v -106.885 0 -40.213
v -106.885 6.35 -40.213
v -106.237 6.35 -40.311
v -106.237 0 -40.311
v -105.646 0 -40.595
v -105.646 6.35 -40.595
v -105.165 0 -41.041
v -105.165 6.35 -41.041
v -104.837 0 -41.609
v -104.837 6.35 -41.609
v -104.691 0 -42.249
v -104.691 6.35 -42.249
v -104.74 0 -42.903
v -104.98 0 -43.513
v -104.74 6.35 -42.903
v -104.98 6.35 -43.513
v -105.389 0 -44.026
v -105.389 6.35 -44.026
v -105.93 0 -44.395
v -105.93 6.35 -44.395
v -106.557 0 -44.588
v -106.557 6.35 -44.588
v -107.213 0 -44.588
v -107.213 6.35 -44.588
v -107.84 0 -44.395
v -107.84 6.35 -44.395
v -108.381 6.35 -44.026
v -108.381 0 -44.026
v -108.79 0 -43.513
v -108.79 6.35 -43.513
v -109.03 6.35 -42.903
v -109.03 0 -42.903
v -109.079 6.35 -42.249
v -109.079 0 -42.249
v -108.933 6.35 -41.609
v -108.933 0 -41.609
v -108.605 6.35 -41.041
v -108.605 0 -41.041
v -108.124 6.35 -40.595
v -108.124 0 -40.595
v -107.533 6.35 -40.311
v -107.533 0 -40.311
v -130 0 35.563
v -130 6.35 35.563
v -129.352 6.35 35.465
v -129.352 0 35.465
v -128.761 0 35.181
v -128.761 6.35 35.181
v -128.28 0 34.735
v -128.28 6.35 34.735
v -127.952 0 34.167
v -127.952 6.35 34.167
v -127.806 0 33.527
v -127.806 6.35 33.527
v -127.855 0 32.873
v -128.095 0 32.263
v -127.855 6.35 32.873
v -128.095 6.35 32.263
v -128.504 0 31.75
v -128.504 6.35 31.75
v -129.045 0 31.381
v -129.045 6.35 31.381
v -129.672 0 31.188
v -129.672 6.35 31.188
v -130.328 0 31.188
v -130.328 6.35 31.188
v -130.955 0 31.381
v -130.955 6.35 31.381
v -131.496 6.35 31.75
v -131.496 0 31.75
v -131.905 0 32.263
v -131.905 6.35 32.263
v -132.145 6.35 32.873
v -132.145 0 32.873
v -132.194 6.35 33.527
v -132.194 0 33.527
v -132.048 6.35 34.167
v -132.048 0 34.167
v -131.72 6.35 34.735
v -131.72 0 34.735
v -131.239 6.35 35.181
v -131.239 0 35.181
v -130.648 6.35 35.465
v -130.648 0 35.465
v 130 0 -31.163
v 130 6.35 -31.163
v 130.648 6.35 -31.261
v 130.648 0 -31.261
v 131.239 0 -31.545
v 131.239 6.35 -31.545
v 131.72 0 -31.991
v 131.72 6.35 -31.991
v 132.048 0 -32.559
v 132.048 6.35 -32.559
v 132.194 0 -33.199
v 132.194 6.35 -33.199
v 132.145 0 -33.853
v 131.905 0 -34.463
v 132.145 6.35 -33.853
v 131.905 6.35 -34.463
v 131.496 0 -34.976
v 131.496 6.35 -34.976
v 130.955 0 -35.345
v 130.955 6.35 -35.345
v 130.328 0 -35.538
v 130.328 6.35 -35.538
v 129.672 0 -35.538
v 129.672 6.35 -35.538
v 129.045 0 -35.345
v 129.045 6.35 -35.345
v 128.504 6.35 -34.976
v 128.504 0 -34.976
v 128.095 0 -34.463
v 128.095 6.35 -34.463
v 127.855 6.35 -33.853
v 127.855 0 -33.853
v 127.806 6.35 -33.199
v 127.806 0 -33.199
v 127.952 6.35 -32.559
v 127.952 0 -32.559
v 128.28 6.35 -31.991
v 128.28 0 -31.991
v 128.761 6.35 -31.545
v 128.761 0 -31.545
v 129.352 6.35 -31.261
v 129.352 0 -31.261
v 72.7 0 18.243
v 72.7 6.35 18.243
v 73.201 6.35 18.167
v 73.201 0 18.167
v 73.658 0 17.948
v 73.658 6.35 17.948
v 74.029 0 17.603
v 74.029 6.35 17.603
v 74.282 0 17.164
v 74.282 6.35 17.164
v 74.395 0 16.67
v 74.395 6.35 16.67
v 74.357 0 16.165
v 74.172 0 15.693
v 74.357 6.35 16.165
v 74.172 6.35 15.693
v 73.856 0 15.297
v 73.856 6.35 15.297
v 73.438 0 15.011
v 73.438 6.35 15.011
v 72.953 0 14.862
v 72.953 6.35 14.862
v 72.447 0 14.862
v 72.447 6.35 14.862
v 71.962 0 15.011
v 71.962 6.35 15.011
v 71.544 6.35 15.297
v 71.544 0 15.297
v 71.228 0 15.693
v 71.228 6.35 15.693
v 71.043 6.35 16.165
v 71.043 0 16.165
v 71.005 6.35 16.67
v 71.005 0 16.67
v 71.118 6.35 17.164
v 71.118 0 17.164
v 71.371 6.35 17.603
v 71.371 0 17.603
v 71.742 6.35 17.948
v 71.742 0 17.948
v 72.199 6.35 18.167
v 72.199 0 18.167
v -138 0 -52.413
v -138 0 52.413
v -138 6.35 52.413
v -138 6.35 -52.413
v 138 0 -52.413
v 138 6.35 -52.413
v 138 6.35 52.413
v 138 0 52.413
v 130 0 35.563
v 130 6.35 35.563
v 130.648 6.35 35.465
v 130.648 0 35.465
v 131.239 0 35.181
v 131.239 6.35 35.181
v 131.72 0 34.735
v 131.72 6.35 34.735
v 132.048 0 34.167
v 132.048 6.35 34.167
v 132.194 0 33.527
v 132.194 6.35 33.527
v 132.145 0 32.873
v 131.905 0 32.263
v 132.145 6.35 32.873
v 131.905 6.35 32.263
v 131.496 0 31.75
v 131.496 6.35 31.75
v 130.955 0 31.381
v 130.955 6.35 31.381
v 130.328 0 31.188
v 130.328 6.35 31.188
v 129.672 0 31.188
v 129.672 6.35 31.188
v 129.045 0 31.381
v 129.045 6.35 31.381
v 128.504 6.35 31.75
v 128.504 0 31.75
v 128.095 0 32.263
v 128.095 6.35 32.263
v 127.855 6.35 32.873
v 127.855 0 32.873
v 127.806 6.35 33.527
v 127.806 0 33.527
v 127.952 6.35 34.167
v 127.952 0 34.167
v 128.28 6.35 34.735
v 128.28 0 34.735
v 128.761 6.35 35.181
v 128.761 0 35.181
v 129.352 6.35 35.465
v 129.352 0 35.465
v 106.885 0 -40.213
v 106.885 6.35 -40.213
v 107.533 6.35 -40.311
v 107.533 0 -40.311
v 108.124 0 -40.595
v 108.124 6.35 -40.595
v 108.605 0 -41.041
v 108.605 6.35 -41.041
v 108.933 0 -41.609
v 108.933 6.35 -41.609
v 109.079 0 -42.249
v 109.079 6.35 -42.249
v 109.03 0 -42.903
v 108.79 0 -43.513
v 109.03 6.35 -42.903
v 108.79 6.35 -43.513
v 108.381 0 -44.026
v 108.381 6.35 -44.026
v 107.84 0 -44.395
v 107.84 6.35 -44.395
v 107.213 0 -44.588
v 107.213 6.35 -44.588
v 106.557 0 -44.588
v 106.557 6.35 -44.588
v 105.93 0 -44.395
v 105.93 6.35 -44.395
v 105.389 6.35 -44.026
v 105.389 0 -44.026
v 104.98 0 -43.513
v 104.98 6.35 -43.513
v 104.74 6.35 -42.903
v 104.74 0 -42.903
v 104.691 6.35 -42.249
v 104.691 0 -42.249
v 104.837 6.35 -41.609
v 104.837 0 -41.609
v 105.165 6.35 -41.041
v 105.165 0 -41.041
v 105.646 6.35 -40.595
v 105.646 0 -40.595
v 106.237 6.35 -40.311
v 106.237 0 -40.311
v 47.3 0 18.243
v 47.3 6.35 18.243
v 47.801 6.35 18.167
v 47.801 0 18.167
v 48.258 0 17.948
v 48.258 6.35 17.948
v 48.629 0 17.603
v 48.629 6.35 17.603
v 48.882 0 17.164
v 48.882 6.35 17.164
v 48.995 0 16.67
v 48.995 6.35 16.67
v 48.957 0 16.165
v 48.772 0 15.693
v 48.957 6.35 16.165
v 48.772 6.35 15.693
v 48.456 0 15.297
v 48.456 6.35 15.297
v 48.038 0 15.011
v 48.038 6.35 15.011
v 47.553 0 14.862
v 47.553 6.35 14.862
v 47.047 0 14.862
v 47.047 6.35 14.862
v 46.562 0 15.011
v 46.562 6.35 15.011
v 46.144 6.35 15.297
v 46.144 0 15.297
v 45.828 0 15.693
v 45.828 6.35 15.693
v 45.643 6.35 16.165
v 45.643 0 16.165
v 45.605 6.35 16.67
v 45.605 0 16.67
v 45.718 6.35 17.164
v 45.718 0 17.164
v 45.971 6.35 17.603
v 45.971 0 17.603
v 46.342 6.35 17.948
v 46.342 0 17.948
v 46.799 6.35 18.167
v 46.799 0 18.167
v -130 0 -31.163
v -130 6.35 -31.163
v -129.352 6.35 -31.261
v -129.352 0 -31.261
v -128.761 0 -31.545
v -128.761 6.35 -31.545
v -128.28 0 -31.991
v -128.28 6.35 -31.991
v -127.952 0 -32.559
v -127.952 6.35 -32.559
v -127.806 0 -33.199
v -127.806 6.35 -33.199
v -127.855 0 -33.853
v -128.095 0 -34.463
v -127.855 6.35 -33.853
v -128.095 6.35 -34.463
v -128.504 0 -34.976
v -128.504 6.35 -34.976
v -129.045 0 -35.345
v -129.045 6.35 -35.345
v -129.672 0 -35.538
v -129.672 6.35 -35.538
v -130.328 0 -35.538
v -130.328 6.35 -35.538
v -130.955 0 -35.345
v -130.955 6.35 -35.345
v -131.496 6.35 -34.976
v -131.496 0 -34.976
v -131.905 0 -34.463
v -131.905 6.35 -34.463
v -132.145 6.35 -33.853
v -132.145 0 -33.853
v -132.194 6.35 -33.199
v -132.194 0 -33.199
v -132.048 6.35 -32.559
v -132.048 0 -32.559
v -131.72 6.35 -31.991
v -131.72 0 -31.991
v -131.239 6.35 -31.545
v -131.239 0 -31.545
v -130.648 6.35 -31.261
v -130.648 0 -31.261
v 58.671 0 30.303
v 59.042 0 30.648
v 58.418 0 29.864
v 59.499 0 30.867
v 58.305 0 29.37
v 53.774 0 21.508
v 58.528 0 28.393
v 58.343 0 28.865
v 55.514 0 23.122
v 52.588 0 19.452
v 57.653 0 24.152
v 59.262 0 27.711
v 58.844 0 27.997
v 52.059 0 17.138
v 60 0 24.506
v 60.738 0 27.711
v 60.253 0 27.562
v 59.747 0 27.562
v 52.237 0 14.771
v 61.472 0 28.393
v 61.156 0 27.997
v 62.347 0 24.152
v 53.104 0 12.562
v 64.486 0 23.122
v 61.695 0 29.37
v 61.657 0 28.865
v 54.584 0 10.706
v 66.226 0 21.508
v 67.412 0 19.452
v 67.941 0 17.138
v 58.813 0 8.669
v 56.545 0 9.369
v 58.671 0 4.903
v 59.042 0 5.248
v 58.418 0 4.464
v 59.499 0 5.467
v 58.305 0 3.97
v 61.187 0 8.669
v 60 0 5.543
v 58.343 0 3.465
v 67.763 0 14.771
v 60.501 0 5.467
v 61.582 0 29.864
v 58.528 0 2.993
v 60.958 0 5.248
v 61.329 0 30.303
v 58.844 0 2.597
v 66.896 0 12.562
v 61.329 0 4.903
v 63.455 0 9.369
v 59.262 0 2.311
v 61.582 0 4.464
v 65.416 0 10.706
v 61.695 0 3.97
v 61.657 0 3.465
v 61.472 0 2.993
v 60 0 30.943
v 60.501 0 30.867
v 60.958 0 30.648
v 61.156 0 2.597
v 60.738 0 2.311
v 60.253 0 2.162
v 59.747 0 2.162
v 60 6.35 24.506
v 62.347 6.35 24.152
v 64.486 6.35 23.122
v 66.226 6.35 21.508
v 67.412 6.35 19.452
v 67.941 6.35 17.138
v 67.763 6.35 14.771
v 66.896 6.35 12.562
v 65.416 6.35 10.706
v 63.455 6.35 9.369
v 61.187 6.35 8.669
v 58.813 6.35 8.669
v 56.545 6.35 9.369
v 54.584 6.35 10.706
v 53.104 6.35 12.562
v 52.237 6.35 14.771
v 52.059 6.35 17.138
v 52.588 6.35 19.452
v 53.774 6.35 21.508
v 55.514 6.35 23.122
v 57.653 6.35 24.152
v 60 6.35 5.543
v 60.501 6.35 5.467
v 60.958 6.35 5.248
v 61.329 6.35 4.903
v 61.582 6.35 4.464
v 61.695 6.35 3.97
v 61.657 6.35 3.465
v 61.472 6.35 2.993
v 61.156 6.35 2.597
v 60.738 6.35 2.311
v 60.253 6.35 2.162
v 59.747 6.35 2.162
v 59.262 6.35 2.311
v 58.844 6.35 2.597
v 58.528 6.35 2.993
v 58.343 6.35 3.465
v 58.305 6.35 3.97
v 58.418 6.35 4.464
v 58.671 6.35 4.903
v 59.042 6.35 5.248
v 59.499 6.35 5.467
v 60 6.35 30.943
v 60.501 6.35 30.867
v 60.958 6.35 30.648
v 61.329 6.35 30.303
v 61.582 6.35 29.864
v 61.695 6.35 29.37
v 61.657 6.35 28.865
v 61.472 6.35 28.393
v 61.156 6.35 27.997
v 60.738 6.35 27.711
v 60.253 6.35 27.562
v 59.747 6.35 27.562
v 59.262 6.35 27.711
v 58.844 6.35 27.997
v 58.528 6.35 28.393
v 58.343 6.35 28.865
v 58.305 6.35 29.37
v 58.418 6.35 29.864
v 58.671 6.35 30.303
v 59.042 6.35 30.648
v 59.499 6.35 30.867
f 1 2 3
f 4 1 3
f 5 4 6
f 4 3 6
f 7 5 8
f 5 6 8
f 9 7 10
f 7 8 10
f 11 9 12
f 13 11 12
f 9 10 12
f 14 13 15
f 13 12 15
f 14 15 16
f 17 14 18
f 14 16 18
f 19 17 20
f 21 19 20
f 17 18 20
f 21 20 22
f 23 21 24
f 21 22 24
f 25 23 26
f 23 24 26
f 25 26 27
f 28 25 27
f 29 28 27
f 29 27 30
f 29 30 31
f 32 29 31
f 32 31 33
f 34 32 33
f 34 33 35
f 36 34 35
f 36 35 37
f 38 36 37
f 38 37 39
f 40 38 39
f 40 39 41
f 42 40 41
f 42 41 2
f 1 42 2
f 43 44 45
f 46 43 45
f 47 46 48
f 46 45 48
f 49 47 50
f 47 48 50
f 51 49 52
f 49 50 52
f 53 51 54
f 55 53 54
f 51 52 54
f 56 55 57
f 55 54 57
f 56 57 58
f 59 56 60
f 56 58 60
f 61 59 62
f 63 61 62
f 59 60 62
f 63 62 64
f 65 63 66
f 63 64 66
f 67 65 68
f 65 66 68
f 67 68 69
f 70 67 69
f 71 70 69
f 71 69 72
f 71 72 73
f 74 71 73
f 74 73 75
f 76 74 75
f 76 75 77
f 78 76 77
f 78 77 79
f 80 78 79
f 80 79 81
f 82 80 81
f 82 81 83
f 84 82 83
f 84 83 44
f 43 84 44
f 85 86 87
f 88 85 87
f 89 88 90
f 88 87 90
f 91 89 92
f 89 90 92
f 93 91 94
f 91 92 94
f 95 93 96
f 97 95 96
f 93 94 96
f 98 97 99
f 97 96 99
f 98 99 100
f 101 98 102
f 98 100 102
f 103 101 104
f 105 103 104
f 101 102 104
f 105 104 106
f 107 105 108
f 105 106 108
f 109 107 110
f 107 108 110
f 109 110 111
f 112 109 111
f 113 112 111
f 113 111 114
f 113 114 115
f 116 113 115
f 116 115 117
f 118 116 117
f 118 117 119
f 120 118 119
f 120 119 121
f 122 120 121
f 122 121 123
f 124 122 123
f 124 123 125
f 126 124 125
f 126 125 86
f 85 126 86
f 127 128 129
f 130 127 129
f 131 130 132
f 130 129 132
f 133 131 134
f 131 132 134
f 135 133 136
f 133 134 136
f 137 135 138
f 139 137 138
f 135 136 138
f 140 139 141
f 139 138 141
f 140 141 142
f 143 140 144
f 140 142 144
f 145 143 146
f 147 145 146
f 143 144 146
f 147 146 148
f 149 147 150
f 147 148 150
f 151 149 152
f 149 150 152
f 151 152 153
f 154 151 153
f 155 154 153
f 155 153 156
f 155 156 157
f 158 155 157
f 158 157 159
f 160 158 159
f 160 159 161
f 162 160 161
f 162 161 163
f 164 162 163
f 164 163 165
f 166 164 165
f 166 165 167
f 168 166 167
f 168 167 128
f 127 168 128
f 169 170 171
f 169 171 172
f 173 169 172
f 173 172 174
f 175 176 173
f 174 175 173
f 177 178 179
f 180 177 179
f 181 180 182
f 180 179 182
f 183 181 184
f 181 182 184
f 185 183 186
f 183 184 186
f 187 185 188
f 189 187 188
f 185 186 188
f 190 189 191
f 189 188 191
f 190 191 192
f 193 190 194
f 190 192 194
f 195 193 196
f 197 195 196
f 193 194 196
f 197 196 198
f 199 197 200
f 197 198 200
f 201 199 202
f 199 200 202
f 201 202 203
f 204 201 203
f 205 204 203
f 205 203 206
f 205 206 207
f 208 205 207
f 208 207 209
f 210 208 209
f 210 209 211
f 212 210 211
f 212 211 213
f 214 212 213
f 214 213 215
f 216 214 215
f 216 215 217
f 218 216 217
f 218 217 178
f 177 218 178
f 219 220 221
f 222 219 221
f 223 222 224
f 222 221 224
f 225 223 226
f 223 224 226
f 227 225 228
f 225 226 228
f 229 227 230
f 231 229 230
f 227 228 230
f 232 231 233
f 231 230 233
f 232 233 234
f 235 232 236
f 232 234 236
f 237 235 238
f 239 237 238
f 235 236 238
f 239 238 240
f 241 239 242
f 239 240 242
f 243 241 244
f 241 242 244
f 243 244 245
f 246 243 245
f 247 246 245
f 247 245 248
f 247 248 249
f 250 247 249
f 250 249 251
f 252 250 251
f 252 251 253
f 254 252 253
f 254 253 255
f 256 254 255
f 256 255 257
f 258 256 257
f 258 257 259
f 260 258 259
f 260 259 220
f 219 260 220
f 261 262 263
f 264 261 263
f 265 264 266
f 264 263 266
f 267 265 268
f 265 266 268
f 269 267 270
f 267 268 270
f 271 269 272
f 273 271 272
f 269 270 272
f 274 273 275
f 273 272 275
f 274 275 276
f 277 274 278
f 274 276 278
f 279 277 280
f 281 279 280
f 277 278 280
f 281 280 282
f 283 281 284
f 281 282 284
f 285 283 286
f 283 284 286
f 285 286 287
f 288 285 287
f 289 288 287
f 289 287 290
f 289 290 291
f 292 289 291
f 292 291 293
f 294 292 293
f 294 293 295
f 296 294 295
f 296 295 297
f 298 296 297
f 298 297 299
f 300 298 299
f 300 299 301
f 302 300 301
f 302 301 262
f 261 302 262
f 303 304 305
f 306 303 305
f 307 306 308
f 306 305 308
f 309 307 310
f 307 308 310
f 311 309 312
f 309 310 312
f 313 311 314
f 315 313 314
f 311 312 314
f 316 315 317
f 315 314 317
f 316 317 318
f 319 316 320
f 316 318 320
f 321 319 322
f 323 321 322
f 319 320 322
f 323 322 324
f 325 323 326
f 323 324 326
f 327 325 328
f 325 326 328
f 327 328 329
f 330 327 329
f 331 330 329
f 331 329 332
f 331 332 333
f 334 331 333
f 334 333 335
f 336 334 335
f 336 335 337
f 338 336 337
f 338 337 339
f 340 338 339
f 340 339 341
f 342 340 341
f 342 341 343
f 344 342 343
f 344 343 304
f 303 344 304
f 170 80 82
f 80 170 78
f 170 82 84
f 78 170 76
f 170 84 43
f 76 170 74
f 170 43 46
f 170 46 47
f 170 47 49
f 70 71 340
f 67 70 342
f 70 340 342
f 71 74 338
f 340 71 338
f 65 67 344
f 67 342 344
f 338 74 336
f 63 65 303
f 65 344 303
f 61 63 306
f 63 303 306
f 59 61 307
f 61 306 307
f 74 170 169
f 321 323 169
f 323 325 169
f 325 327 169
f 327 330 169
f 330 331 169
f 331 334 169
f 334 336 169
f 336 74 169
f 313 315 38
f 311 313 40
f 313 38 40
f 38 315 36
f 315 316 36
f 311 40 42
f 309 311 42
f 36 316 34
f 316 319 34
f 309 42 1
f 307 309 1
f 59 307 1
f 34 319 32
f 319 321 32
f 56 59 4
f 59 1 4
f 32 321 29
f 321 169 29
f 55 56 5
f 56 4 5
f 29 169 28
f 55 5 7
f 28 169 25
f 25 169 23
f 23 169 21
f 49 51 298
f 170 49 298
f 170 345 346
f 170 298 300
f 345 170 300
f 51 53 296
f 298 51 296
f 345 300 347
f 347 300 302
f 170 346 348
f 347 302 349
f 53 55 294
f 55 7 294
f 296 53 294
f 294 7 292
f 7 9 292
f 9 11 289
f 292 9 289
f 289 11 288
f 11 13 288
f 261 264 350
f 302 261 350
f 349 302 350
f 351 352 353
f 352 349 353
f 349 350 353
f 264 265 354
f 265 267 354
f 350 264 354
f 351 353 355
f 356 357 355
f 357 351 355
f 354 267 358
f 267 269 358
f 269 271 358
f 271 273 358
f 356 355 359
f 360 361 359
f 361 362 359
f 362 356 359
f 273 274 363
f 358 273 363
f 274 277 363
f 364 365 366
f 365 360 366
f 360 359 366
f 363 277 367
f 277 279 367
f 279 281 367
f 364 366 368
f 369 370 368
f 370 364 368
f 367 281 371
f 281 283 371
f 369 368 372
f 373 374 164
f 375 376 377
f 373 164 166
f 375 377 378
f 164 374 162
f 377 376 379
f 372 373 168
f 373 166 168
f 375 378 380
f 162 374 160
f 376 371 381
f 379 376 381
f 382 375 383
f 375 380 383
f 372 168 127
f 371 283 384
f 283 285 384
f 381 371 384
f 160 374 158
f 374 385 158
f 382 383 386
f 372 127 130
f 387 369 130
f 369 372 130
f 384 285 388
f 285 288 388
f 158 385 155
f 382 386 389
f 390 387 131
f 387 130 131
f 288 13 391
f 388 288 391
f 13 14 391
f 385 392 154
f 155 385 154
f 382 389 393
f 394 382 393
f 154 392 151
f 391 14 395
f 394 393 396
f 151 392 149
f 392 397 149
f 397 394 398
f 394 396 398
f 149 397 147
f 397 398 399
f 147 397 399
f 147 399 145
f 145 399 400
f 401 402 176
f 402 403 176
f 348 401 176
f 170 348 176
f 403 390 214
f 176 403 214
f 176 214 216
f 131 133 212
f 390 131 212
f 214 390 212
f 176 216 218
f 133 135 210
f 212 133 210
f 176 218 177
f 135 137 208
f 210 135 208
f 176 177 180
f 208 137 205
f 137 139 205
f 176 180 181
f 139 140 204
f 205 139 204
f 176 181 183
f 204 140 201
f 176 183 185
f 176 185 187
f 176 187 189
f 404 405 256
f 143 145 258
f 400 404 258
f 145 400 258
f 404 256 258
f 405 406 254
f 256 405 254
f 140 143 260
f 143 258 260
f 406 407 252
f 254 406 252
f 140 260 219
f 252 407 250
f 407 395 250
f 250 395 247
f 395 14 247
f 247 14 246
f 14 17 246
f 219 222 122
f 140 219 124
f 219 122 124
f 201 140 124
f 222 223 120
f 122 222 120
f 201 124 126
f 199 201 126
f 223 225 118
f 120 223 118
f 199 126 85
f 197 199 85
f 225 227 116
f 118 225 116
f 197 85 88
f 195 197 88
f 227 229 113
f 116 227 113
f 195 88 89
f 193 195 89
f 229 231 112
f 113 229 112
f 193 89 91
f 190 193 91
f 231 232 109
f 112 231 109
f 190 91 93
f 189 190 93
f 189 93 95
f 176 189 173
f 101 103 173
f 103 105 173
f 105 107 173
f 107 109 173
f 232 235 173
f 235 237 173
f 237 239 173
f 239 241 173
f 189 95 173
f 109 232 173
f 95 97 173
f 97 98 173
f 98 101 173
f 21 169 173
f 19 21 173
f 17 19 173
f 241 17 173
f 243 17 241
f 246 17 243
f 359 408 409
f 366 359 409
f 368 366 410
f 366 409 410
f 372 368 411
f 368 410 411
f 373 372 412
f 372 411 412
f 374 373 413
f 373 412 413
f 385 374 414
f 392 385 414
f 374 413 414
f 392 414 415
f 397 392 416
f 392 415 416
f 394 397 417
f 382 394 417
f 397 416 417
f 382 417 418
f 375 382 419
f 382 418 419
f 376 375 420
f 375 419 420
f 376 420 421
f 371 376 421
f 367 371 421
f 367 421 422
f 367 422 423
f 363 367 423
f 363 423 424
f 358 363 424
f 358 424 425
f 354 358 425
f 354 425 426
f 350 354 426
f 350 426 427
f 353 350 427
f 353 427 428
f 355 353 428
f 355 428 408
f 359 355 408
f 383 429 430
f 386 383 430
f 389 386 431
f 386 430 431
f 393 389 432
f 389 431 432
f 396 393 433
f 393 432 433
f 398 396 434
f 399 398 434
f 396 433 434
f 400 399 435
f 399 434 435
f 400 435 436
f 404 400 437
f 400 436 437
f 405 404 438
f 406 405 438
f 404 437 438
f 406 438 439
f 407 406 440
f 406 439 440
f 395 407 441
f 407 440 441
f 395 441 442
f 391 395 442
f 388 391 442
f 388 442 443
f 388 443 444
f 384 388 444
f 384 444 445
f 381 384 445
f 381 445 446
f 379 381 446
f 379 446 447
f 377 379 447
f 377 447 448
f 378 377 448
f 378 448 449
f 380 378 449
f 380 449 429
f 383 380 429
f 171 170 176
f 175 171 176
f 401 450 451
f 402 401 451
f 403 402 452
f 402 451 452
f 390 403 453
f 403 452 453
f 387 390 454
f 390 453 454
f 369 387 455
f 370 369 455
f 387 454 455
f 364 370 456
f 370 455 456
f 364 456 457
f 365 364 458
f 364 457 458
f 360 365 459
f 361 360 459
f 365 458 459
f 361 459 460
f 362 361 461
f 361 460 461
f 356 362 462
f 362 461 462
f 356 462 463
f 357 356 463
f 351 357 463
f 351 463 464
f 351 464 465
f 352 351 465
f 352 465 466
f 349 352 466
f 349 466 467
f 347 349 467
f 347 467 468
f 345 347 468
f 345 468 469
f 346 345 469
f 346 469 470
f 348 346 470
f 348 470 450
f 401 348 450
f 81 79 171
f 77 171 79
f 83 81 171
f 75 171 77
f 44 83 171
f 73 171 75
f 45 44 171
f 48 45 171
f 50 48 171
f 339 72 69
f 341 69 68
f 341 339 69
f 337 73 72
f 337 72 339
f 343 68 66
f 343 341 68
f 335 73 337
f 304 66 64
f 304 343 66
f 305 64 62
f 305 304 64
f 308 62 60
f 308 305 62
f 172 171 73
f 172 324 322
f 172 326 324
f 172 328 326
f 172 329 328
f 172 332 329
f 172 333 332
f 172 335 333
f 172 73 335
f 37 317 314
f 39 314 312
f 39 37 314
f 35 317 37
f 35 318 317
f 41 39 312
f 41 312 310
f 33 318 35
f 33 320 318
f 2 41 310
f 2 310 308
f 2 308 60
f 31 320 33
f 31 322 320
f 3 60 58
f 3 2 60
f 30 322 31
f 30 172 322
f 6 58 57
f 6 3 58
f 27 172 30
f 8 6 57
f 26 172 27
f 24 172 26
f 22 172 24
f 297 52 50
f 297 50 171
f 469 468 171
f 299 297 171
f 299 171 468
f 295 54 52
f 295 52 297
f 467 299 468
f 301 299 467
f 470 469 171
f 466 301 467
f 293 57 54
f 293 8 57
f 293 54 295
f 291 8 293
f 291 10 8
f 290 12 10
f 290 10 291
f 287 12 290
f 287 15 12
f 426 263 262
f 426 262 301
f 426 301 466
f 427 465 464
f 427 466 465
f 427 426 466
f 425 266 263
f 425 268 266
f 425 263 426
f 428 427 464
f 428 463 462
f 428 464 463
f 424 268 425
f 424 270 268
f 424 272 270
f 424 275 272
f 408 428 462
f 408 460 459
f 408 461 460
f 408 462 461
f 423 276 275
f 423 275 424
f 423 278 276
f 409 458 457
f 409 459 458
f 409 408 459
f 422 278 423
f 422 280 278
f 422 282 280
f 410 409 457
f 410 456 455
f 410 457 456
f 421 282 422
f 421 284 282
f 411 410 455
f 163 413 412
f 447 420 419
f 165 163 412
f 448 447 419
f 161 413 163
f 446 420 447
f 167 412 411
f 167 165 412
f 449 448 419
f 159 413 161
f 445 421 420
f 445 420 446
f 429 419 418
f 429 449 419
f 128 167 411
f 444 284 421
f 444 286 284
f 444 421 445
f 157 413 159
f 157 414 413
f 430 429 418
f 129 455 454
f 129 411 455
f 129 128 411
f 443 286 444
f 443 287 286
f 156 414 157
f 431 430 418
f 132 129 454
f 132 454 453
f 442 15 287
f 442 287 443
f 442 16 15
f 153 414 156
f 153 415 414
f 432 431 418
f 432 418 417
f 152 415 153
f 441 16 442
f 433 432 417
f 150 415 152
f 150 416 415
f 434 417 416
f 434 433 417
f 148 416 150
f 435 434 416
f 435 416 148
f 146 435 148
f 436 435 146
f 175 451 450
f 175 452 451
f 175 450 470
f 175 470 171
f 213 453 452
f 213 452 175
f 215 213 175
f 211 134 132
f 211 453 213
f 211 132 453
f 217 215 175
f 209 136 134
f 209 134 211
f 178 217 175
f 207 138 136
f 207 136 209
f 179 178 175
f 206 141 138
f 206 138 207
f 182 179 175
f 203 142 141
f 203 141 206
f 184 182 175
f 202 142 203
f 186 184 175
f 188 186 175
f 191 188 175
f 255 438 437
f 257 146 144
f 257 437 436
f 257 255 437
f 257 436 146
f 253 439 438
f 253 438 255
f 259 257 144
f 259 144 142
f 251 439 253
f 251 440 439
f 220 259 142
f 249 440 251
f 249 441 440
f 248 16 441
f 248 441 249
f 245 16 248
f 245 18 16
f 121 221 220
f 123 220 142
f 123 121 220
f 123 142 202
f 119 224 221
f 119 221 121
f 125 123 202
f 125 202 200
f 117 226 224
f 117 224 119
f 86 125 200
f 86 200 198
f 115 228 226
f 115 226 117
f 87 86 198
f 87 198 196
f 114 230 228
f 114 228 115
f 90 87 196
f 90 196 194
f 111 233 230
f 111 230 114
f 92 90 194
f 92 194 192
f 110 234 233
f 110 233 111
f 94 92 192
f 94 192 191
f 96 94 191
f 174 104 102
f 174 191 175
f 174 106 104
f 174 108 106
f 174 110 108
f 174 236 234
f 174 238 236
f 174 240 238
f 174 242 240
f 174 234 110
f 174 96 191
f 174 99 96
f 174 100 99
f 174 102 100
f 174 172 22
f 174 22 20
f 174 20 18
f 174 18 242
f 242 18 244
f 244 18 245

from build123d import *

# Parameters (mm, degrees)
SKETCH1_W           = 276
SKETCH1_H           = 104.826000086
BOSS_EXTRUDE1_DEPTH = 6.35
CUT_EXTRUDE1_REACH  = 149.755
SKETCH2_R           = 2.2
CUT_EXTRUDE2_REACH  = 149.755
SKETCH3_R           = 2.2
CUT_EXTRUDE3_REACH  = 149.755
SKETCH4_R           = 7.9629
CUT_EXTRUDE4_REACH  = 149.755
SKETCH5_R           = 1.7


with BuildPart() as part:
    # Sketch1 → Boss-Extrude1 (new body)
    with BuildSketch(Plane(origin=(0, 0, 0), x_dir=(1, 0, 0), z_dir=(0, 1, 0))):
        Rectangle(SKETCH1_W, SKETCH1_H)
    extrude(amount=BOSS_EXTRUDE1_DEPTH)

    # Sketch2 → Cut-Extrude1 (cut, up to next)
    with BuildSketch(Plane(origin=(0, 6.35, 0), x_dir=(1, 0, 0), z_dir=(0, 1, 0)), mode=Mode.PRIVATE) as cut_extrude1_sk1:
        with Locations(Location((-130, 33.363000043, 0), (0, 0, 270))):
            Circle(SKETCH2_R)
    cut_extrude1_tool1 = extrude(cut_extrude1_sk1.sketch, amount=-CUT_EXTRUDE1_REACH, mode=Mode.PRIVATE) & part.part
    # Sketch2 → Cut-Extrude1 (cut, up to next)
    with BuildSketch(Plane(origin=(0, 6.35, 0), x_dir=(1, 0, 0), z_dir=(0, 1, 0)), mode=Mode.PRIVATE) as cut_extrude1_sk2:
        with Locations(Location((-130, -33.363000043, 0), (0, 0, 270))):
            Circle(SKETCH2_R)
    cut_extrude1_tool2 = extrude(cut_extrude1_sk2.sketch, amount=-CUT_EXTRUDE1_REACH, mode=Mode.PRIVATE) & part.part
    # Sketch2 → Cut-Extrude1 (cut, up to next)
    with BuildSketch(Plane(origin=(0, 6.35, 0), x_dir=(1, 0, 0), z_dir=(0, 1, 0)), mode=Mode.PRIVATE) as cut_extrude1_sk3:
        with Locations(Location((130, -33.363000043, 0), (0, 0, 270))):
            Circle(SKETCH2_R)
    cut_extrude1_tool3 = extrude(cut_extrude1_sk3.sketch, amount=-CUT_EXTRUDE1_REACH, mode=Mode.PRIVATE) & part.part
    # Sketch2 → Cut-Extrude1 (cut, up to next)
    with BuildSketch(Plane(origin=(0, 6.35, 0), x_dir=(1, 0, 0), z_dir=(0, 1, 0)), mode=Mode.PRIVATE) as cut_extrude1_sk4:
        with Locations(Location((130, 33.363000043, 0), (0, 0, 270))):
            Circle(SKETCH2_R)
    cut_extrude1_tool4 = extrude(cut_extrude1_sk4.sketch, amount=-CUT_EXTRUDE1_REACH, mode=Mode.PRIVATE) & part.part
    add(cut_extrude1_tool1.solids().sort_by_distance((-130, 6.35, -33.363))[0], mode=Mode.SUBTRACT)
    add(cut_extrude1_tool2.solids().sort_by_distance((-130, 6.35, 33.363))[0], mode=Mode.SUBTRACT)
    add(cut_extrude1_tool3.solids().sort_by_distance((130, 6.35, 33.363))[0], mode=Mode.SUBTRACT)
    add(cut_extrude1_tool4.solids().sort_by_distance((130, 6.35, -33.363))[0], mode=Mode.SUBTRACT)

    # Sketch3 → Cut-Extrude2 (cut, up to next)
    with BuildSketch(Plane(origin=(0, 6.35, 0), x_dir=(1, 0, 0), z_dir=(0, 1, 0)), mode=Mode.PRIVATE) as cut_extrude2_sk1:
        with Locations(Location((-106.885, 42.413000043, 0), (0, 0, 270))):
            Circle(SKETCH3_R)
    cut_extrude2_tool1 = extrude(cut_extrude2_sk1.sketch, amount=-CUT_EXTRUDE2_REACH, mode=Mode.PRIVATE) & part.part
    # Sketch3 → Cut-Extrude2 (cut, up to next)
    with BuildSketch(Plane(origin=(0, 6.35, 0), x_dir=(1, 0, 0), z_dir=(0, 1, 0)), mode=Mode.PRIVATE) as cut_extrude2_sk2:
        with Locations(Location((106.885, 42.413000043, 0), (0, 0, 270))):
            Circle(SKETCH3_R)
    cut_extrude2_tool2 = extrude(cut_extrude2_sk2.sketch, amount=-CUT_EXTRUDE2_REACH, mode=Mode.PRIVATE) & part.part
    add(cut_extrude2_tool1.solids().sort_by_distance((-106.885, 6.35, -42.413))[0], mode=Mode.SUBTRACT)
    add(cut_extrude2_tool2.solids().sort_by_distance((106.885, 6.35, -42.413))[0], mode=Mode.SUBTRACT)

    # Sketch4 → Cut-Extrude3 (cut, up to next)
    with BuildSketch(Plane(origin=(0, 6.35, 0), x_dir=(1, 0, 0), z_dir=(0, 1, 0)), mode=Mode.PRIVATE) as cut_extrude3_sk1:
        with Locations(Location((60, -16.543000155, 0), (0, 0, 270))):
            Circle(SKETCH4_R)
    cut_extrude3_tool1 = extrude(cut_extrude3_sk1.sketch, amount=-CUT_EXTRUDE3_REACH, mode=Mode.PRIVATE) & part.part
    add(cut_extrude3_tool1.solids().sort_by_distance((60, 6.35, 16.543))[0], mode=Mode.SUBTRACT)

    # Sketch5 → Cut-Extrude4 (cut, up to next)
    with BuildSketch(Plane(origin=(0, 6.35, 0), x_dir=(1, 0, 0), z_dir=(0, 1, 0)), mode=Mode.PRIVATE) as cut_extrude4_sk1:
        with Locations(Location((60, -3.843000155, 0), (0, 0, 270))):
            Circle(SKETCH5_R)
    cut_extrude4_tool1 = extrude(cut_extrude4_sk1.sketch, amount=-CUT_EXTRUDE4_REACH, mode=Mode.PRIVATE) & part.part
    # Sketch5 → Cut-Extrude4 (cut, up to next)
    with BuildSketch(Plane(origin=(0, 6.35, 0), x_dir=(1, 0, 0), z_dir=(0, 1, 0)), mode=Mode.PRIVATE) as cut_extrude4_sk2:
        with Locations(Location((72.7, -16.543000155, 0), (0, 0, 270))):
            Circle(SKETCH5_R)
    cut_extrude4_tool2 = extrude(cut_extrude4_sk2.sketch, amount=-CUT_EXTRUDE4_REACH, mode=Mode.PRIVATE) & part.part
    # Sketch5 → Cut-Extrude4 (cut, up to next)
    with BuildSketch(Plane(origin=(0, 6.35, 0), x_dir=(1, 0, 0), z_dir=(0, 1, 0)), mode=Mode.PRIVATE) as cut_extrude4_sk3:
        with Locations(Location((60, -29.243000155, 0), (0, 0, 270))):
            Circle(SKETCH5_R)
    cut_extrude4_tool3 = extrude(cut_extrude4_sk3.sketch, amount=-CUT_EXTRUDE4_REACH, mode=Mode.PRIVATE) & part.part
    # Sketch5 → Cut-Extrude4 (cut, up to next)
    with BuildSketch(Plane(origin=(0, 6.35, 0), x_dir=(1, 0, 0), z_dir=(0, 1, 0)), mode=Mode.PRIVATE) as cut_extrude4_sk4:
        with Locations(Location((47.3, -16.543000155, 0), (0, 0, 270))):
            Circle(SKETCH5_R)
    cut_extrude4_tool4 = extrude(cut_extrude4_sk4.sketch, amount=-CUT_EXTRUDE4_REACH, mode=Mode.PRIVATE) & part.part
    add(cut_extrude4_tool1.solids().sort_by_distance((60, 6.35, 3.843))[0], mode=Mode.SUBTRACT)
    add(cut_extrude4_tool2.solids().sort_by_distance((72.7, 6.35, 16.543))[0], mode=Mode.SUBTRACT)
    add(cut_extrude4_tool3.solids().sort_by_distance((60, 6.35, 29.243))[0], mode=Mode.SUBTRACT)
    add(cut_extrude4_tool4.solids().sort_by_distance((47.3, 6.35, 16.543))[0], mode=Mode.SUBTRACT)


solid = part.part
